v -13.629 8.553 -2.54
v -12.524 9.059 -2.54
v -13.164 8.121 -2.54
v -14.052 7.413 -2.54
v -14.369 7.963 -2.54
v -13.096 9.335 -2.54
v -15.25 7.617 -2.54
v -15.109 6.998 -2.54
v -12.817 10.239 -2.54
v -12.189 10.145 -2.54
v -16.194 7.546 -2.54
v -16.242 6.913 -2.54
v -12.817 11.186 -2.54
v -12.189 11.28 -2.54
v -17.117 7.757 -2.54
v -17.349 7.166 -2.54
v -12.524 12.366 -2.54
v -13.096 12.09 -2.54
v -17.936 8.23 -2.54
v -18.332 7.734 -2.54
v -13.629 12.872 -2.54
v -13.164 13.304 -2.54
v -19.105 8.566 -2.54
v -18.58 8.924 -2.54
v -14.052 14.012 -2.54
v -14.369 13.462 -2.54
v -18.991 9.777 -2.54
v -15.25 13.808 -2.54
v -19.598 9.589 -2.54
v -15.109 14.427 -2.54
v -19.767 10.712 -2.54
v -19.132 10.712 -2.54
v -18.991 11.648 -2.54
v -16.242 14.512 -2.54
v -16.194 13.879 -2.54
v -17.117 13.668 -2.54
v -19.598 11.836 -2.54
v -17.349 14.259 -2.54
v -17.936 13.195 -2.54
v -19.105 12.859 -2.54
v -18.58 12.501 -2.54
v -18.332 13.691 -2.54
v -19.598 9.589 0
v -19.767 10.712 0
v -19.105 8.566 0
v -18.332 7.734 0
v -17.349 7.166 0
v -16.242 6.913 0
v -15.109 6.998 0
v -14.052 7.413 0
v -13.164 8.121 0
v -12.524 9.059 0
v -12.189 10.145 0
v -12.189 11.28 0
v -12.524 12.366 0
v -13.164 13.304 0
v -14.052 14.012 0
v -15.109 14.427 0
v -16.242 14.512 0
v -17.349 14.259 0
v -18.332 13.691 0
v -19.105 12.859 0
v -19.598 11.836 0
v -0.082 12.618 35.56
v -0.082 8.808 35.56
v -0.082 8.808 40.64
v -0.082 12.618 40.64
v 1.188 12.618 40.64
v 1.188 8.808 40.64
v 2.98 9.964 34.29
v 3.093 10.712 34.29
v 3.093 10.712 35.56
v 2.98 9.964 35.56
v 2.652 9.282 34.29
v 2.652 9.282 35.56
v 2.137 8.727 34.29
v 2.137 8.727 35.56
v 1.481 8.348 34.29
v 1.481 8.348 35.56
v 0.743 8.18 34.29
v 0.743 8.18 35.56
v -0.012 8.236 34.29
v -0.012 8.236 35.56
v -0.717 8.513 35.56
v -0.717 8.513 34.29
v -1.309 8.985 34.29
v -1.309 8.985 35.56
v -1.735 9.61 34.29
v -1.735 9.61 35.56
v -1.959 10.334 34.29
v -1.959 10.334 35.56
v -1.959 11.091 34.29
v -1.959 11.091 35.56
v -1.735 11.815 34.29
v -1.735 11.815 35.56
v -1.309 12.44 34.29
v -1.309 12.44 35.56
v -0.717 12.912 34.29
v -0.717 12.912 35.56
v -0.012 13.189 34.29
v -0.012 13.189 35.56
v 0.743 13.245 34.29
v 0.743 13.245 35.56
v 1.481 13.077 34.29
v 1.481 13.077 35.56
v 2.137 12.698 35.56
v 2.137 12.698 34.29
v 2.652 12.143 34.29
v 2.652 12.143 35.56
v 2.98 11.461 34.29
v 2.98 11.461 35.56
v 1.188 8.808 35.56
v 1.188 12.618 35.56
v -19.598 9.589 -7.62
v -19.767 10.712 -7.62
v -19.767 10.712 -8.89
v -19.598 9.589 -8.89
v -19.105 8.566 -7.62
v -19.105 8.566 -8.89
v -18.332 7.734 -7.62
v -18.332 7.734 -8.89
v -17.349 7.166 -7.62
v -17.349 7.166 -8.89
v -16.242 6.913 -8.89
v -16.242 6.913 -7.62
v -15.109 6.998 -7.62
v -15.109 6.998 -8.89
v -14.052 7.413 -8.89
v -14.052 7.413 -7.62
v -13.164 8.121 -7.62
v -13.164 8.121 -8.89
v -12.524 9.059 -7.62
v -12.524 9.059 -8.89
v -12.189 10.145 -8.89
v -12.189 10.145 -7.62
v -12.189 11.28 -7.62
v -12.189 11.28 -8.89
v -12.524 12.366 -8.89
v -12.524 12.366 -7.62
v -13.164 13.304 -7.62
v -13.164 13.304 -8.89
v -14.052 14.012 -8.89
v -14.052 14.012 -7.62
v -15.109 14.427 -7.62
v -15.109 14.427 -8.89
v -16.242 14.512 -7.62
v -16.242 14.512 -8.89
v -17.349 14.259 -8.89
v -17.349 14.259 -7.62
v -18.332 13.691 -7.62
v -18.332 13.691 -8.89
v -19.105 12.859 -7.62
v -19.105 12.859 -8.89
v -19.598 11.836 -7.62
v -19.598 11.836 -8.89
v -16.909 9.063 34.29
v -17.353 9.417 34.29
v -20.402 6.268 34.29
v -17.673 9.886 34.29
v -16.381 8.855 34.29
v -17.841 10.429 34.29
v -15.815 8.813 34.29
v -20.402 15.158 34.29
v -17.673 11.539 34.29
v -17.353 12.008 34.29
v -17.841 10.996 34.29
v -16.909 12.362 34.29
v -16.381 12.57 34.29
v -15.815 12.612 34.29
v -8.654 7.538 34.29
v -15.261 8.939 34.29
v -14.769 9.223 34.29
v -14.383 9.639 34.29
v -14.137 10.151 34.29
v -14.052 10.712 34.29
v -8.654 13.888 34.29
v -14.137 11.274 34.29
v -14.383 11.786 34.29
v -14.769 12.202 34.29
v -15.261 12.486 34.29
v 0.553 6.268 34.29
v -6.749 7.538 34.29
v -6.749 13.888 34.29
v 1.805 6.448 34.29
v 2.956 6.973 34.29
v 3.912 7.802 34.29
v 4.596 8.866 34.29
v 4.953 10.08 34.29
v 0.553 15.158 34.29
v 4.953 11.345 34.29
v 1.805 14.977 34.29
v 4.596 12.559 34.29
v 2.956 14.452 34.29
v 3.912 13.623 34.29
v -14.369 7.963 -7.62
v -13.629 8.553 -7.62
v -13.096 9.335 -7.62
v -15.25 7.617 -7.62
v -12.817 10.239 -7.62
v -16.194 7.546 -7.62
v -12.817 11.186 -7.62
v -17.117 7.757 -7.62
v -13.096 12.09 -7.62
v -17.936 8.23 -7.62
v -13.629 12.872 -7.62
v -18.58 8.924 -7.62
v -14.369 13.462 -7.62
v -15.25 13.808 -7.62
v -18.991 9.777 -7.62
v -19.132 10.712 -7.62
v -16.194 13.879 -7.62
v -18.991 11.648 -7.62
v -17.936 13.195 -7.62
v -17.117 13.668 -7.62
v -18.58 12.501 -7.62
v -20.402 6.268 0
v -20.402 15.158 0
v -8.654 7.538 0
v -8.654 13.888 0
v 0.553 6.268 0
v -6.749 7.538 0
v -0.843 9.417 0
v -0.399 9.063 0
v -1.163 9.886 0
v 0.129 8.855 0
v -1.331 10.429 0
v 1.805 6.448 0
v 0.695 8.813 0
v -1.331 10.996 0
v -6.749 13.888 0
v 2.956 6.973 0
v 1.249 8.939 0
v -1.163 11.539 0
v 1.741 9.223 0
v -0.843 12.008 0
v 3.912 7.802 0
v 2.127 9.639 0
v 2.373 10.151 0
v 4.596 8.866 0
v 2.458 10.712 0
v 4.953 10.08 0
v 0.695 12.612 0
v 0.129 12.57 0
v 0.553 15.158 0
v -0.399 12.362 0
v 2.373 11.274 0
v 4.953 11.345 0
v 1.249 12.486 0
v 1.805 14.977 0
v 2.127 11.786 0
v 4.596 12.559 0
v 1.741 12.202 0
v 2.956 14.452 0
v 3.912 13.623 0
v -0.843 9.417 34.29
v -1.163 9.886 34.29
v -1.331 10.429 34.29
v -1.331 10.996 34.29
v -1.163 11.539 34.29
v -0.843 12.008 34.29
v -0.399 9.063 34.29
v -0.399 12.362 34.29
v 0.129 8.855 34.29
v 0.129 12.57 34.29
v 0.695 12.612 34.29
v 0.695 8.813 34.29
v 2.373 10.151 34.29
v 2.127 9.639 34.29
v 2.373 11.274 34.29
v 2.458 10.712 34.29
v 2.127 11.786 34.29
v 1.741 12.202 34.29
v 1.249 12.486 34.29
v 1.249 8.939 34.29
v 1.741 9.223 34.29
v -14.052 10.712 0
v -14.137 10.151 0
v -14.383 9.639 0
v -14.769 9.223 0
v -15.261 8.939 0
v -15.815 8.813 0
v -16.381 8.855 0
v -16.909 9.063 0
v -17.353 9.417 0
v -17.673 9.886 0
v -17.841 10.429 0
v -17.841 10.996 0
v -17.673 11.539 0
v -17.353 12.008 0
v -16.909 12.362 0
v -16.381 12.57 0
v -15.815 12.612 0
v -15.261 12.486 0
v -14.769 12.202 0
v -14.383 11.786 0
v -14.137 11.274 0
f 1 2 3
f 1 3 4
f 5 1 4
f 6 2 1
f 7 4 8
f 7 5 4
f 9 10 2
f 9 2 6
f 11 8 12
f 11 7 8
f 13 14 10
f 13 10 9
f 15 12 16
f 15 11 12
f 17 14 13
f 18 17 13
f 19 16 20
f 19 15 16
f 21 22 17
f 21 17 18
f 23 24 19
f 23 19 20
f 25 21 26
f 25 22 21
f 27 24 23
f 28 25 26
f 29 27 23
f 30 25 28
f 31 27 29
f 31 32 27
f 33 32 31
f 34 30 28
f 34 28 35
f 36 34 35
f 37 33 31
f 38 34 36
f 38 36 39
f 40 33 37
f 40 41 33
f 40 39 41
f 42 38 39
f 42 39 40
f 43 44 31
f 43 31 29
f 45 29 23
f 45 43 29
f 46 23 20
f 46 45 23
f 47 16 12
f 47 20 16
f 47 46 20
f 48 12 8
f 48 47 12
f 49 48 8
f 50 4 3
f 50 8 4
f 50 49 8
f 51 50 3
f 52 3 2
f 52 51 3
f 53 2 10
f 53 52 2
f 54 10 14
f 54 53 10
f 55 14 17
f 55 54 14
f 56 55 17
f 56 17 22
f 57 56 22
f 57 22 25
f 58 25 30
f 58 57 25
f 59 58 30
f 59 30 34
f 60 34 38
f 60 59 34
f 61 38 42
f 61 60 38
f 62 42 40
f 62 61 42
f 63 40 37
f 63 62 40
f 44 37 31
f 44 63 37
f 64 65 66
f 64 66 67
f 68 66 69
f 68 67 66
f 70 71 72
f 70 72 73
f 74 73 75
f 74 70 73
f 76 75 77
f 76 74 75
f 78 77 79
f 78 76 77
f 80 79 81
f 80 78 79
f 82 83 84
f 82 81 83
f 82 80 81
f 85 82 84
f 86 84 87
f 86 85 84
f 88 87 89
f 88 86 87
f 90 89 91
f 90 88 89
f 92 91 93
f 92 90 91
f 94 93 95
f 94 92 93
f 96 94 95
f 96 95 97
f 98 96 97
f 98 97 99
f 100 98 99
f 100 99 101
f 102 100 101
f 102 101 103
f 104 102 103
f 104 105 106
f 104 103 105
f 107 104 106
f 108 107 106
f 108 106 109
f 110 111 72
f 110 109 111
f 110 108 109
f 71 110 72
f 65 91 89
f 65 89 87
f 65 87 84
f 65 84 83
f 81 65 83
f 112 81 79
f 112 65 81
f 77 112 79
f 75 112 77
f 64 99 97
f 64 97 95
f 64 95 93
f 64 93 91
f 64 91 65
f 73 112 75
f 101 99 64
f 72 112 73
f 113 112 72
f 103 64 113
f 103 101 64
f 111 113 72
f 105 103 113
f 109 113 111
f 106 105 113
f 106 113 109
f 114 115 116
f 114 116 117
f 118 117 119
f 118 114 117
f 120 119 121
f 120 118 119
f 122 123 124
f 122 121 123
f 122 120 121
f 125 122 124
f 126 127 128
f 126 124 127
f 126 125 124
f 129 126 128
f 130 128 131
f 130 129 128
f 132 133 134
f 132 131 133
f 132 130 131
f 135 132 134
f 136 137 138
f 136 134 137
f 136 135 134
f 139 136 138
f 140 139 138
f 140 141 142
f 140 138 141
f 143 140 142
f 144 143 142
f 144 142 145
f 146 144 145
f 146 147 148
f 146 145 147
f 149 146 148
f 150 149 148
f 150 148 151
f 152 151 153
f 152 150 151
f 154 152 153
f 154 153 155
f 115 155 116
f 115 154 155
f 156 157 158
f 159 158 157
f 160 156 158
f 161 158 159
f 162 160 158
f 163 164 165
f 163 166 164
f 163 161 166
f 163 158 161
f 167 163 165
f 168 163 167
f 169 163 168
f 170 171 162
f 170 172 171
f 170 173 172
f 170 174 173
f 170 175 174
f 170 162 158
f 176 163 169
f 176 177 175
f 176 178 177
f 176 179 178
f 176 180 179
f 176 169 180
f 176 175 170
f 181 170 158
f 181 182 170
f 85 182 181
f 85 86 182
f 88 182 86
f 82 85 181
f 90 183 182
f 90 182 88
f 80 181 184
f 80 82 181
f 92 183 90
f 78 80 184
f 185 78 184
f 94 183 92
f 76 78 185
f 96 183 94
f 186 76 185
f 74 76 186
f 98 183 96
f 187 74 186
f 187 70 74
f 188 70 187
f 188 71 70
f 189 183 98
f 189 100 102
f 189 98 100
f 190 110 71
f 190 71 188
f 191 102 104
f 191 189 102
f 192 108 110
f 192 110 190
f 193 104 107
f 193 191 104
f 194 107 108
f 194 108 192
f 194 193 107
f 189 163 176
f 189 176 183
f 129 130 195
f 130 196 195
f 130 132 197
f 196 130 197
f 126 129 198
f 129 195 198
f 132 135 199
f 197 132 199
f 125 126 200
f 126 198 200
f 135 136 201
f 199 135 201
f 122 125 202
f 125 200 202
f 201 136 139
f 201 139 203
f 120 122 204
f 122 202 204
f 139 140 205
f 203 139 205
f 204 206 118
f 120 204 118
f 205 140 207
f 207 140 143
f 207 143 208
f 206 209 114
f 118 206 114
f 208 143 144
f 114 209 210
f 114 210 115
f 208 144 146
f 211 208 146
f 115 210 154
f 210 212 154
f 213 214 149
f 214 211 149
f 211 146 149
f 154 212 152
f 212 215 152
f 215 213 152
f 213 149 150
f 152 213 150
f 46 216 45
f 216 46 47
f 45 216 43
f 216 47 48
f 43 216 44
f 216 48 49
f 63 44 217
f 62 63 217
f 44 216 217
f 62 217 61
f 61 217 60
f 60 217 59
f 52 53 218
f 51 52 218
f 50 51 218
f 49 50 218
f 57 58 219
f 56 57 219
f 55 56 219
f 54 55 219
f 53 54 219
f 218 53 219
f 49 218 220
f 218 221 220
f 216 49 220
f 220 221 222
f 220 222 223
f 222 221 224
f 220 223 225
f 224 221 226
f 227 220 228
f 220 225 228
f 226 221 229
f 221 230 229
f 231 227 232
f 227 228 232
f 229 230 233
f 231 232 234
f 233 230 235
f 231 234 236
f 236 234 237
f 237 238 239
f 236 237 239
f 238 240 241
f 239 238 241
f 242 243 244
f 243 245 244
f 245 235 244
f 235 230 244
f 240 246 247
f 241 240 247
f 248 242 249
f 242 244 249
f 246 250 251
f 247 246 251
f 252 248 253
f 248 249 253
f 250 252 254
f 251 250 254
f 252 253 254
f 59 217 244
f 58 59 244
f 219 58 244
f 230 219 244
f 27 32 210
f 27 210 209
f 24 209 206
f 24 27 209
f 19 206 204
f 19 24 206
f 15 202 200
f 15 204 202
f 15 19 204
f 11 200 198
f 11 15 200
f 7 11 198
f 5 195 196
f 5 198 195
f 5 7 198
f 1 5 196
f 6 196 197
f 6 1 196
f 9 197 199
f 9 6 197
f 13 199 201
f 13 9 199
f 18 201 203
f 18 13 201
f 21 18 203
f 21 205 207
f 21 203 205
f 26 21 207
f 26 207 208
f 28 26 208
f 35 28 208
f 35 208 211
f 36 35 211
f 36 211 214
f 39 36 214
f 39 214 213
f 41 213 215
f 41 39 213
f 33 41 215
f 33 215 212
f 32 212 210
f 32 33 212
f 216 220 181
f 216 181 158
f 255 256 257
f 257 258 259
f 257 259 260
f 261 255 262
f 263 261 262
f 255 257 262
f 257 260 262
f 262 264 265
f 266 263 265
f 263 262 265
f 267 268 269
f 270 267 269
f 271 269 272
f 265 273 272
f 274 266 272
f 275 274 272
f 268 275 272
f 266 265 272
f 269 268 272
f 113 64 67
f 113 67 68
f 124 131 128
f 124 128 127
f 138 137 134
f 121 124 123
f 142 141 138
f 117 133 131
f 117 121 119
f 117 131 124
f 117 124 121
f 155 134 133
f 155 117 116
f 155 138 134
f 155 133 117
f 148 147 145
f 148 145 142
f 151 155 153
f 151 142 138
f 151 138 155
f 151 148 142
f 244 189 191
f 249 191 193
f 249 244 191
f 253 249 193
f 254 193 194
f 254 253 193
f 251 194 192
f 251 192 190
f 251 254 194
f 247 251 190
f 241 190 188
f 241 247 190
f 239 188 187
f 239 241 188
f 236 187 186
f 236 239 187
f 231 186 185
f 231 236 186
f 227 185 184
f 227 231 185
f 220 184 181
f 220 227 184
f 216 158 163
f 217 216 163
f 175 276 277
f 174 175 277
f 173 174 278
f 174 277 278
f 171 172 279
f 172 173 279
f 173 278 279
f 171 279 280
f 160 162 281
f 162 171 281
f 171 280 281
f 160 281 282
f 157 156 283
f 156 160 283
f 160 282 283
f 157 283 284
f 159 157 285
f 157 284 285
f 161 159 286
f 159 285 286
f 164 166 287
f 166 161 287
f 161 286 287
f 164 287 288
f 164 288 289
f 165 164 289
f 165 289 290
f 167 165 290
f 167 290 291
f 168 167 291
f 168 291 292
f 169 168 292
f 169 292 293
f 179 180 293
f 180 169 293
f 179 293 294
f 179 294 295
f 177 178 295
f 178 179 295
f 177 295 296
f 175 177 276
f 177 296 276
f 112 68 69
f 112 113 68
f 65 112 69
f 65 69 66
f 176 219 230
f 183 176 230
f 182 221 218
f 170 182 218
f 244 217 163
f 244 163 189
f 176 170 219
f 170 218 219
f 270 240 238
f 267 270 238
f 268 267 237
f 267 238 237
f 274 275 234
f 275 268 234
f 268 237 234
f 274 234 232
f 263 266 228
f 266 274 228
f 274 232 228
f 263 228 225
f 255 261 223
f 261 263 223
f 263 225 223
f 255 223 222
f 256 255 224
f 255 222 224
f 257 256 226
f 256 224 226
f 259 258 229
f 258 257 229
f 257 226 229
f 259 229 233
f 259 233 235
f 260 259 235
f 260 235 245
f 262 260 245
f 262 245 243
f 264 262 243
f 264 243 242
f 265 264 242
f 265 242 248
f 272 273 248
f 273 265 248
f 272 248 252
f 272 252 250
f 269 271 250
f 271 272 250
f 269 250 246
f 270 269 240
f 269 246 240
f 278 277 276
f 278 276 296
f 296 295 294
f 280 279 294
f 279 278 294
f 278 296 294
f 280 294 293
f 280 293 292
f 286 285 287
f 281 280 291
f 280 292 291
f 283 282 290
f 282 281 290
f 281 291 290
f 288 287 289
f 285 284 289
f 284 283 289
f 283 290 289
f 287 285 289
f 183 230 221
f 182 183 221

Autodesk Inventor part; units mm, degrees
ref_plane "YZ Plane" through (0, 0, 0) normal (1, 0, 0) x (0, 1, 0)
ref_plane "XZ Plane" through (0, 0, 0) normal (0, 1, 0) x (-1, 0, 0)
ref_plane "XY Plane" through (0, 0, 0) normal (0, 0, 1) x (1, 0, 0)
sketch "Sketch1" plane through (0, 0, 0) normal (0, 0, 1) x (1, 0, 0)
  line L0 (-20.4019, 15.1575) -> (4.9981, 15.1575)
  line L1 (4.9981, 15.1575) -> (4.9981, 6.2675)
  line L2 (4.9981, 6.2675) -> (-20.4019, 6.2675)
  line L3 (-20.4019, 6.2675) -> (-20.4019, 15.1575)
  arc A0 (0.5531, 6.2675) -> (0.5531, 15.1575) centre (0.5531, 10.7125) ccw
  circle A1 centre (-15.9569, 10.7125) radius 1.905
  circle A2 centre (0.5531, 10.7125) radius 1.905
  line L4 (-8.6544, 13.8875) -> (-6.7494, 13.8875)
  line L5 (-6.7494, 13.8875) -> (-6.7494, 7.5375)
  line L6 (-6.7494, 7.5375) -> (-8.6544, 7.5375)
  line L7 (-8.6544, 7.5375) -> (-8.6544, 13.8875)
  point P0 (0, 0)
  dimension "d0" = 25.4
  dimension "d1" = 8.89
  dimension "d2" = 0
  dimension "d3" = 0
  dimension "d4" = 3.81
  dimension "d5" = 3.81
  dimension "d6" = 0
  dimension "d7" = 4.445
  dimension "d8" = 4.445
  dimension "d9" = 7.3025
  dimension "d12" = 1.905
  dimension "d13" = 6.35
extrude "Extrusion1" add sketch "Sketch1" along normal blind 34.29 contours L0 A0 L2 L3
sketch "Sketch2" plane through (0, 0, 0) normal (0, 0, -1) x (-1, 0, 0)
  circle A0 centre (15.9569, 10.7125) radius 1.905 projected
  circle A1 centre (15.9569, 10.7125) radius 1.905
  circle A2 centre (15.9569, 10.7125) radius 3.81
  point P0 (0, 0)
  dimension "d19" = 7.62
extrude "Extrusion2" add sketch "Sketch2" along normal blind 2.54 contours A0 | A2
sketch "Sketch3" plane through (-15.9569, 10.7125, -2.54) normal (0, 0, -1) x (-1, 0, 0)
  circle A0 centre (0, 0) radius 3.81 projected
  circle A1 centre (0, 0) radius 3.175
  point P0 (-15.9569, -10.7125)
  dimension "d22" = 6.35
extrude "Extrusion3" add sketch "Sketch3" along normal blind 5.08 contours A1
sketch "Sketch4" plane through (-15.9569, 10.7125, -7.62) normal (0, 0, -1) x (-1, 0, 0)
  circle A0 centre (0, 0) radius 3.81 projected
  circle A1 centre (0, 0) radius 3.81
  point P0 (-15.9569, -10.7125)
extrude "Extrusion4" add sketch "Sketch4" along normal blind 1.27
sketch "Sketch5" plane through (0, 0, 34.29) normal (0, 0, 1) x (1, 0, 0)
  arc A0 (0.5531, 6.2675) -> (0.5531, 15.1575) centre (0.5531, 10.7125) ccw projected
  circle A1 centre (0.5531, 10.7125) radius 2.54
  point P0 (0, 0)
  dimension "d27" = 5.08
extrude "Extrusion5" add sketch "Sketch5" along normal blind 1.27
sketch "Sketch6" plane through (0.5531, 10.7125, 35.56) normal (0, 0, 1) x (1, 0, 0)
  circle A0 centre (0, 0) radius 2.54 projected
  line L0 (-0.635, 1.905) -> (0.635, 1.905)
  line L1 (0.635, 1.905) -> (0.635, -1.905)
  line L2 (0.635, -1.905) -> (-0.635, -1.905)
  line L3 (-0.635, -1.905) -> (-0.635, 1.905)
  point P0 (-0.5531, -10.7125)
  dimension "d30" = 3.81
  dimension "d31" = 1.27
  dimension "d32" = 0.635
  dimension "d33" = 1.905
extrude "Extrusion6" add sketch "Sketch6" along normal blind 5.08 contours L0 L1 L2 L3
properties part number "Vacuum Valve 1764"
